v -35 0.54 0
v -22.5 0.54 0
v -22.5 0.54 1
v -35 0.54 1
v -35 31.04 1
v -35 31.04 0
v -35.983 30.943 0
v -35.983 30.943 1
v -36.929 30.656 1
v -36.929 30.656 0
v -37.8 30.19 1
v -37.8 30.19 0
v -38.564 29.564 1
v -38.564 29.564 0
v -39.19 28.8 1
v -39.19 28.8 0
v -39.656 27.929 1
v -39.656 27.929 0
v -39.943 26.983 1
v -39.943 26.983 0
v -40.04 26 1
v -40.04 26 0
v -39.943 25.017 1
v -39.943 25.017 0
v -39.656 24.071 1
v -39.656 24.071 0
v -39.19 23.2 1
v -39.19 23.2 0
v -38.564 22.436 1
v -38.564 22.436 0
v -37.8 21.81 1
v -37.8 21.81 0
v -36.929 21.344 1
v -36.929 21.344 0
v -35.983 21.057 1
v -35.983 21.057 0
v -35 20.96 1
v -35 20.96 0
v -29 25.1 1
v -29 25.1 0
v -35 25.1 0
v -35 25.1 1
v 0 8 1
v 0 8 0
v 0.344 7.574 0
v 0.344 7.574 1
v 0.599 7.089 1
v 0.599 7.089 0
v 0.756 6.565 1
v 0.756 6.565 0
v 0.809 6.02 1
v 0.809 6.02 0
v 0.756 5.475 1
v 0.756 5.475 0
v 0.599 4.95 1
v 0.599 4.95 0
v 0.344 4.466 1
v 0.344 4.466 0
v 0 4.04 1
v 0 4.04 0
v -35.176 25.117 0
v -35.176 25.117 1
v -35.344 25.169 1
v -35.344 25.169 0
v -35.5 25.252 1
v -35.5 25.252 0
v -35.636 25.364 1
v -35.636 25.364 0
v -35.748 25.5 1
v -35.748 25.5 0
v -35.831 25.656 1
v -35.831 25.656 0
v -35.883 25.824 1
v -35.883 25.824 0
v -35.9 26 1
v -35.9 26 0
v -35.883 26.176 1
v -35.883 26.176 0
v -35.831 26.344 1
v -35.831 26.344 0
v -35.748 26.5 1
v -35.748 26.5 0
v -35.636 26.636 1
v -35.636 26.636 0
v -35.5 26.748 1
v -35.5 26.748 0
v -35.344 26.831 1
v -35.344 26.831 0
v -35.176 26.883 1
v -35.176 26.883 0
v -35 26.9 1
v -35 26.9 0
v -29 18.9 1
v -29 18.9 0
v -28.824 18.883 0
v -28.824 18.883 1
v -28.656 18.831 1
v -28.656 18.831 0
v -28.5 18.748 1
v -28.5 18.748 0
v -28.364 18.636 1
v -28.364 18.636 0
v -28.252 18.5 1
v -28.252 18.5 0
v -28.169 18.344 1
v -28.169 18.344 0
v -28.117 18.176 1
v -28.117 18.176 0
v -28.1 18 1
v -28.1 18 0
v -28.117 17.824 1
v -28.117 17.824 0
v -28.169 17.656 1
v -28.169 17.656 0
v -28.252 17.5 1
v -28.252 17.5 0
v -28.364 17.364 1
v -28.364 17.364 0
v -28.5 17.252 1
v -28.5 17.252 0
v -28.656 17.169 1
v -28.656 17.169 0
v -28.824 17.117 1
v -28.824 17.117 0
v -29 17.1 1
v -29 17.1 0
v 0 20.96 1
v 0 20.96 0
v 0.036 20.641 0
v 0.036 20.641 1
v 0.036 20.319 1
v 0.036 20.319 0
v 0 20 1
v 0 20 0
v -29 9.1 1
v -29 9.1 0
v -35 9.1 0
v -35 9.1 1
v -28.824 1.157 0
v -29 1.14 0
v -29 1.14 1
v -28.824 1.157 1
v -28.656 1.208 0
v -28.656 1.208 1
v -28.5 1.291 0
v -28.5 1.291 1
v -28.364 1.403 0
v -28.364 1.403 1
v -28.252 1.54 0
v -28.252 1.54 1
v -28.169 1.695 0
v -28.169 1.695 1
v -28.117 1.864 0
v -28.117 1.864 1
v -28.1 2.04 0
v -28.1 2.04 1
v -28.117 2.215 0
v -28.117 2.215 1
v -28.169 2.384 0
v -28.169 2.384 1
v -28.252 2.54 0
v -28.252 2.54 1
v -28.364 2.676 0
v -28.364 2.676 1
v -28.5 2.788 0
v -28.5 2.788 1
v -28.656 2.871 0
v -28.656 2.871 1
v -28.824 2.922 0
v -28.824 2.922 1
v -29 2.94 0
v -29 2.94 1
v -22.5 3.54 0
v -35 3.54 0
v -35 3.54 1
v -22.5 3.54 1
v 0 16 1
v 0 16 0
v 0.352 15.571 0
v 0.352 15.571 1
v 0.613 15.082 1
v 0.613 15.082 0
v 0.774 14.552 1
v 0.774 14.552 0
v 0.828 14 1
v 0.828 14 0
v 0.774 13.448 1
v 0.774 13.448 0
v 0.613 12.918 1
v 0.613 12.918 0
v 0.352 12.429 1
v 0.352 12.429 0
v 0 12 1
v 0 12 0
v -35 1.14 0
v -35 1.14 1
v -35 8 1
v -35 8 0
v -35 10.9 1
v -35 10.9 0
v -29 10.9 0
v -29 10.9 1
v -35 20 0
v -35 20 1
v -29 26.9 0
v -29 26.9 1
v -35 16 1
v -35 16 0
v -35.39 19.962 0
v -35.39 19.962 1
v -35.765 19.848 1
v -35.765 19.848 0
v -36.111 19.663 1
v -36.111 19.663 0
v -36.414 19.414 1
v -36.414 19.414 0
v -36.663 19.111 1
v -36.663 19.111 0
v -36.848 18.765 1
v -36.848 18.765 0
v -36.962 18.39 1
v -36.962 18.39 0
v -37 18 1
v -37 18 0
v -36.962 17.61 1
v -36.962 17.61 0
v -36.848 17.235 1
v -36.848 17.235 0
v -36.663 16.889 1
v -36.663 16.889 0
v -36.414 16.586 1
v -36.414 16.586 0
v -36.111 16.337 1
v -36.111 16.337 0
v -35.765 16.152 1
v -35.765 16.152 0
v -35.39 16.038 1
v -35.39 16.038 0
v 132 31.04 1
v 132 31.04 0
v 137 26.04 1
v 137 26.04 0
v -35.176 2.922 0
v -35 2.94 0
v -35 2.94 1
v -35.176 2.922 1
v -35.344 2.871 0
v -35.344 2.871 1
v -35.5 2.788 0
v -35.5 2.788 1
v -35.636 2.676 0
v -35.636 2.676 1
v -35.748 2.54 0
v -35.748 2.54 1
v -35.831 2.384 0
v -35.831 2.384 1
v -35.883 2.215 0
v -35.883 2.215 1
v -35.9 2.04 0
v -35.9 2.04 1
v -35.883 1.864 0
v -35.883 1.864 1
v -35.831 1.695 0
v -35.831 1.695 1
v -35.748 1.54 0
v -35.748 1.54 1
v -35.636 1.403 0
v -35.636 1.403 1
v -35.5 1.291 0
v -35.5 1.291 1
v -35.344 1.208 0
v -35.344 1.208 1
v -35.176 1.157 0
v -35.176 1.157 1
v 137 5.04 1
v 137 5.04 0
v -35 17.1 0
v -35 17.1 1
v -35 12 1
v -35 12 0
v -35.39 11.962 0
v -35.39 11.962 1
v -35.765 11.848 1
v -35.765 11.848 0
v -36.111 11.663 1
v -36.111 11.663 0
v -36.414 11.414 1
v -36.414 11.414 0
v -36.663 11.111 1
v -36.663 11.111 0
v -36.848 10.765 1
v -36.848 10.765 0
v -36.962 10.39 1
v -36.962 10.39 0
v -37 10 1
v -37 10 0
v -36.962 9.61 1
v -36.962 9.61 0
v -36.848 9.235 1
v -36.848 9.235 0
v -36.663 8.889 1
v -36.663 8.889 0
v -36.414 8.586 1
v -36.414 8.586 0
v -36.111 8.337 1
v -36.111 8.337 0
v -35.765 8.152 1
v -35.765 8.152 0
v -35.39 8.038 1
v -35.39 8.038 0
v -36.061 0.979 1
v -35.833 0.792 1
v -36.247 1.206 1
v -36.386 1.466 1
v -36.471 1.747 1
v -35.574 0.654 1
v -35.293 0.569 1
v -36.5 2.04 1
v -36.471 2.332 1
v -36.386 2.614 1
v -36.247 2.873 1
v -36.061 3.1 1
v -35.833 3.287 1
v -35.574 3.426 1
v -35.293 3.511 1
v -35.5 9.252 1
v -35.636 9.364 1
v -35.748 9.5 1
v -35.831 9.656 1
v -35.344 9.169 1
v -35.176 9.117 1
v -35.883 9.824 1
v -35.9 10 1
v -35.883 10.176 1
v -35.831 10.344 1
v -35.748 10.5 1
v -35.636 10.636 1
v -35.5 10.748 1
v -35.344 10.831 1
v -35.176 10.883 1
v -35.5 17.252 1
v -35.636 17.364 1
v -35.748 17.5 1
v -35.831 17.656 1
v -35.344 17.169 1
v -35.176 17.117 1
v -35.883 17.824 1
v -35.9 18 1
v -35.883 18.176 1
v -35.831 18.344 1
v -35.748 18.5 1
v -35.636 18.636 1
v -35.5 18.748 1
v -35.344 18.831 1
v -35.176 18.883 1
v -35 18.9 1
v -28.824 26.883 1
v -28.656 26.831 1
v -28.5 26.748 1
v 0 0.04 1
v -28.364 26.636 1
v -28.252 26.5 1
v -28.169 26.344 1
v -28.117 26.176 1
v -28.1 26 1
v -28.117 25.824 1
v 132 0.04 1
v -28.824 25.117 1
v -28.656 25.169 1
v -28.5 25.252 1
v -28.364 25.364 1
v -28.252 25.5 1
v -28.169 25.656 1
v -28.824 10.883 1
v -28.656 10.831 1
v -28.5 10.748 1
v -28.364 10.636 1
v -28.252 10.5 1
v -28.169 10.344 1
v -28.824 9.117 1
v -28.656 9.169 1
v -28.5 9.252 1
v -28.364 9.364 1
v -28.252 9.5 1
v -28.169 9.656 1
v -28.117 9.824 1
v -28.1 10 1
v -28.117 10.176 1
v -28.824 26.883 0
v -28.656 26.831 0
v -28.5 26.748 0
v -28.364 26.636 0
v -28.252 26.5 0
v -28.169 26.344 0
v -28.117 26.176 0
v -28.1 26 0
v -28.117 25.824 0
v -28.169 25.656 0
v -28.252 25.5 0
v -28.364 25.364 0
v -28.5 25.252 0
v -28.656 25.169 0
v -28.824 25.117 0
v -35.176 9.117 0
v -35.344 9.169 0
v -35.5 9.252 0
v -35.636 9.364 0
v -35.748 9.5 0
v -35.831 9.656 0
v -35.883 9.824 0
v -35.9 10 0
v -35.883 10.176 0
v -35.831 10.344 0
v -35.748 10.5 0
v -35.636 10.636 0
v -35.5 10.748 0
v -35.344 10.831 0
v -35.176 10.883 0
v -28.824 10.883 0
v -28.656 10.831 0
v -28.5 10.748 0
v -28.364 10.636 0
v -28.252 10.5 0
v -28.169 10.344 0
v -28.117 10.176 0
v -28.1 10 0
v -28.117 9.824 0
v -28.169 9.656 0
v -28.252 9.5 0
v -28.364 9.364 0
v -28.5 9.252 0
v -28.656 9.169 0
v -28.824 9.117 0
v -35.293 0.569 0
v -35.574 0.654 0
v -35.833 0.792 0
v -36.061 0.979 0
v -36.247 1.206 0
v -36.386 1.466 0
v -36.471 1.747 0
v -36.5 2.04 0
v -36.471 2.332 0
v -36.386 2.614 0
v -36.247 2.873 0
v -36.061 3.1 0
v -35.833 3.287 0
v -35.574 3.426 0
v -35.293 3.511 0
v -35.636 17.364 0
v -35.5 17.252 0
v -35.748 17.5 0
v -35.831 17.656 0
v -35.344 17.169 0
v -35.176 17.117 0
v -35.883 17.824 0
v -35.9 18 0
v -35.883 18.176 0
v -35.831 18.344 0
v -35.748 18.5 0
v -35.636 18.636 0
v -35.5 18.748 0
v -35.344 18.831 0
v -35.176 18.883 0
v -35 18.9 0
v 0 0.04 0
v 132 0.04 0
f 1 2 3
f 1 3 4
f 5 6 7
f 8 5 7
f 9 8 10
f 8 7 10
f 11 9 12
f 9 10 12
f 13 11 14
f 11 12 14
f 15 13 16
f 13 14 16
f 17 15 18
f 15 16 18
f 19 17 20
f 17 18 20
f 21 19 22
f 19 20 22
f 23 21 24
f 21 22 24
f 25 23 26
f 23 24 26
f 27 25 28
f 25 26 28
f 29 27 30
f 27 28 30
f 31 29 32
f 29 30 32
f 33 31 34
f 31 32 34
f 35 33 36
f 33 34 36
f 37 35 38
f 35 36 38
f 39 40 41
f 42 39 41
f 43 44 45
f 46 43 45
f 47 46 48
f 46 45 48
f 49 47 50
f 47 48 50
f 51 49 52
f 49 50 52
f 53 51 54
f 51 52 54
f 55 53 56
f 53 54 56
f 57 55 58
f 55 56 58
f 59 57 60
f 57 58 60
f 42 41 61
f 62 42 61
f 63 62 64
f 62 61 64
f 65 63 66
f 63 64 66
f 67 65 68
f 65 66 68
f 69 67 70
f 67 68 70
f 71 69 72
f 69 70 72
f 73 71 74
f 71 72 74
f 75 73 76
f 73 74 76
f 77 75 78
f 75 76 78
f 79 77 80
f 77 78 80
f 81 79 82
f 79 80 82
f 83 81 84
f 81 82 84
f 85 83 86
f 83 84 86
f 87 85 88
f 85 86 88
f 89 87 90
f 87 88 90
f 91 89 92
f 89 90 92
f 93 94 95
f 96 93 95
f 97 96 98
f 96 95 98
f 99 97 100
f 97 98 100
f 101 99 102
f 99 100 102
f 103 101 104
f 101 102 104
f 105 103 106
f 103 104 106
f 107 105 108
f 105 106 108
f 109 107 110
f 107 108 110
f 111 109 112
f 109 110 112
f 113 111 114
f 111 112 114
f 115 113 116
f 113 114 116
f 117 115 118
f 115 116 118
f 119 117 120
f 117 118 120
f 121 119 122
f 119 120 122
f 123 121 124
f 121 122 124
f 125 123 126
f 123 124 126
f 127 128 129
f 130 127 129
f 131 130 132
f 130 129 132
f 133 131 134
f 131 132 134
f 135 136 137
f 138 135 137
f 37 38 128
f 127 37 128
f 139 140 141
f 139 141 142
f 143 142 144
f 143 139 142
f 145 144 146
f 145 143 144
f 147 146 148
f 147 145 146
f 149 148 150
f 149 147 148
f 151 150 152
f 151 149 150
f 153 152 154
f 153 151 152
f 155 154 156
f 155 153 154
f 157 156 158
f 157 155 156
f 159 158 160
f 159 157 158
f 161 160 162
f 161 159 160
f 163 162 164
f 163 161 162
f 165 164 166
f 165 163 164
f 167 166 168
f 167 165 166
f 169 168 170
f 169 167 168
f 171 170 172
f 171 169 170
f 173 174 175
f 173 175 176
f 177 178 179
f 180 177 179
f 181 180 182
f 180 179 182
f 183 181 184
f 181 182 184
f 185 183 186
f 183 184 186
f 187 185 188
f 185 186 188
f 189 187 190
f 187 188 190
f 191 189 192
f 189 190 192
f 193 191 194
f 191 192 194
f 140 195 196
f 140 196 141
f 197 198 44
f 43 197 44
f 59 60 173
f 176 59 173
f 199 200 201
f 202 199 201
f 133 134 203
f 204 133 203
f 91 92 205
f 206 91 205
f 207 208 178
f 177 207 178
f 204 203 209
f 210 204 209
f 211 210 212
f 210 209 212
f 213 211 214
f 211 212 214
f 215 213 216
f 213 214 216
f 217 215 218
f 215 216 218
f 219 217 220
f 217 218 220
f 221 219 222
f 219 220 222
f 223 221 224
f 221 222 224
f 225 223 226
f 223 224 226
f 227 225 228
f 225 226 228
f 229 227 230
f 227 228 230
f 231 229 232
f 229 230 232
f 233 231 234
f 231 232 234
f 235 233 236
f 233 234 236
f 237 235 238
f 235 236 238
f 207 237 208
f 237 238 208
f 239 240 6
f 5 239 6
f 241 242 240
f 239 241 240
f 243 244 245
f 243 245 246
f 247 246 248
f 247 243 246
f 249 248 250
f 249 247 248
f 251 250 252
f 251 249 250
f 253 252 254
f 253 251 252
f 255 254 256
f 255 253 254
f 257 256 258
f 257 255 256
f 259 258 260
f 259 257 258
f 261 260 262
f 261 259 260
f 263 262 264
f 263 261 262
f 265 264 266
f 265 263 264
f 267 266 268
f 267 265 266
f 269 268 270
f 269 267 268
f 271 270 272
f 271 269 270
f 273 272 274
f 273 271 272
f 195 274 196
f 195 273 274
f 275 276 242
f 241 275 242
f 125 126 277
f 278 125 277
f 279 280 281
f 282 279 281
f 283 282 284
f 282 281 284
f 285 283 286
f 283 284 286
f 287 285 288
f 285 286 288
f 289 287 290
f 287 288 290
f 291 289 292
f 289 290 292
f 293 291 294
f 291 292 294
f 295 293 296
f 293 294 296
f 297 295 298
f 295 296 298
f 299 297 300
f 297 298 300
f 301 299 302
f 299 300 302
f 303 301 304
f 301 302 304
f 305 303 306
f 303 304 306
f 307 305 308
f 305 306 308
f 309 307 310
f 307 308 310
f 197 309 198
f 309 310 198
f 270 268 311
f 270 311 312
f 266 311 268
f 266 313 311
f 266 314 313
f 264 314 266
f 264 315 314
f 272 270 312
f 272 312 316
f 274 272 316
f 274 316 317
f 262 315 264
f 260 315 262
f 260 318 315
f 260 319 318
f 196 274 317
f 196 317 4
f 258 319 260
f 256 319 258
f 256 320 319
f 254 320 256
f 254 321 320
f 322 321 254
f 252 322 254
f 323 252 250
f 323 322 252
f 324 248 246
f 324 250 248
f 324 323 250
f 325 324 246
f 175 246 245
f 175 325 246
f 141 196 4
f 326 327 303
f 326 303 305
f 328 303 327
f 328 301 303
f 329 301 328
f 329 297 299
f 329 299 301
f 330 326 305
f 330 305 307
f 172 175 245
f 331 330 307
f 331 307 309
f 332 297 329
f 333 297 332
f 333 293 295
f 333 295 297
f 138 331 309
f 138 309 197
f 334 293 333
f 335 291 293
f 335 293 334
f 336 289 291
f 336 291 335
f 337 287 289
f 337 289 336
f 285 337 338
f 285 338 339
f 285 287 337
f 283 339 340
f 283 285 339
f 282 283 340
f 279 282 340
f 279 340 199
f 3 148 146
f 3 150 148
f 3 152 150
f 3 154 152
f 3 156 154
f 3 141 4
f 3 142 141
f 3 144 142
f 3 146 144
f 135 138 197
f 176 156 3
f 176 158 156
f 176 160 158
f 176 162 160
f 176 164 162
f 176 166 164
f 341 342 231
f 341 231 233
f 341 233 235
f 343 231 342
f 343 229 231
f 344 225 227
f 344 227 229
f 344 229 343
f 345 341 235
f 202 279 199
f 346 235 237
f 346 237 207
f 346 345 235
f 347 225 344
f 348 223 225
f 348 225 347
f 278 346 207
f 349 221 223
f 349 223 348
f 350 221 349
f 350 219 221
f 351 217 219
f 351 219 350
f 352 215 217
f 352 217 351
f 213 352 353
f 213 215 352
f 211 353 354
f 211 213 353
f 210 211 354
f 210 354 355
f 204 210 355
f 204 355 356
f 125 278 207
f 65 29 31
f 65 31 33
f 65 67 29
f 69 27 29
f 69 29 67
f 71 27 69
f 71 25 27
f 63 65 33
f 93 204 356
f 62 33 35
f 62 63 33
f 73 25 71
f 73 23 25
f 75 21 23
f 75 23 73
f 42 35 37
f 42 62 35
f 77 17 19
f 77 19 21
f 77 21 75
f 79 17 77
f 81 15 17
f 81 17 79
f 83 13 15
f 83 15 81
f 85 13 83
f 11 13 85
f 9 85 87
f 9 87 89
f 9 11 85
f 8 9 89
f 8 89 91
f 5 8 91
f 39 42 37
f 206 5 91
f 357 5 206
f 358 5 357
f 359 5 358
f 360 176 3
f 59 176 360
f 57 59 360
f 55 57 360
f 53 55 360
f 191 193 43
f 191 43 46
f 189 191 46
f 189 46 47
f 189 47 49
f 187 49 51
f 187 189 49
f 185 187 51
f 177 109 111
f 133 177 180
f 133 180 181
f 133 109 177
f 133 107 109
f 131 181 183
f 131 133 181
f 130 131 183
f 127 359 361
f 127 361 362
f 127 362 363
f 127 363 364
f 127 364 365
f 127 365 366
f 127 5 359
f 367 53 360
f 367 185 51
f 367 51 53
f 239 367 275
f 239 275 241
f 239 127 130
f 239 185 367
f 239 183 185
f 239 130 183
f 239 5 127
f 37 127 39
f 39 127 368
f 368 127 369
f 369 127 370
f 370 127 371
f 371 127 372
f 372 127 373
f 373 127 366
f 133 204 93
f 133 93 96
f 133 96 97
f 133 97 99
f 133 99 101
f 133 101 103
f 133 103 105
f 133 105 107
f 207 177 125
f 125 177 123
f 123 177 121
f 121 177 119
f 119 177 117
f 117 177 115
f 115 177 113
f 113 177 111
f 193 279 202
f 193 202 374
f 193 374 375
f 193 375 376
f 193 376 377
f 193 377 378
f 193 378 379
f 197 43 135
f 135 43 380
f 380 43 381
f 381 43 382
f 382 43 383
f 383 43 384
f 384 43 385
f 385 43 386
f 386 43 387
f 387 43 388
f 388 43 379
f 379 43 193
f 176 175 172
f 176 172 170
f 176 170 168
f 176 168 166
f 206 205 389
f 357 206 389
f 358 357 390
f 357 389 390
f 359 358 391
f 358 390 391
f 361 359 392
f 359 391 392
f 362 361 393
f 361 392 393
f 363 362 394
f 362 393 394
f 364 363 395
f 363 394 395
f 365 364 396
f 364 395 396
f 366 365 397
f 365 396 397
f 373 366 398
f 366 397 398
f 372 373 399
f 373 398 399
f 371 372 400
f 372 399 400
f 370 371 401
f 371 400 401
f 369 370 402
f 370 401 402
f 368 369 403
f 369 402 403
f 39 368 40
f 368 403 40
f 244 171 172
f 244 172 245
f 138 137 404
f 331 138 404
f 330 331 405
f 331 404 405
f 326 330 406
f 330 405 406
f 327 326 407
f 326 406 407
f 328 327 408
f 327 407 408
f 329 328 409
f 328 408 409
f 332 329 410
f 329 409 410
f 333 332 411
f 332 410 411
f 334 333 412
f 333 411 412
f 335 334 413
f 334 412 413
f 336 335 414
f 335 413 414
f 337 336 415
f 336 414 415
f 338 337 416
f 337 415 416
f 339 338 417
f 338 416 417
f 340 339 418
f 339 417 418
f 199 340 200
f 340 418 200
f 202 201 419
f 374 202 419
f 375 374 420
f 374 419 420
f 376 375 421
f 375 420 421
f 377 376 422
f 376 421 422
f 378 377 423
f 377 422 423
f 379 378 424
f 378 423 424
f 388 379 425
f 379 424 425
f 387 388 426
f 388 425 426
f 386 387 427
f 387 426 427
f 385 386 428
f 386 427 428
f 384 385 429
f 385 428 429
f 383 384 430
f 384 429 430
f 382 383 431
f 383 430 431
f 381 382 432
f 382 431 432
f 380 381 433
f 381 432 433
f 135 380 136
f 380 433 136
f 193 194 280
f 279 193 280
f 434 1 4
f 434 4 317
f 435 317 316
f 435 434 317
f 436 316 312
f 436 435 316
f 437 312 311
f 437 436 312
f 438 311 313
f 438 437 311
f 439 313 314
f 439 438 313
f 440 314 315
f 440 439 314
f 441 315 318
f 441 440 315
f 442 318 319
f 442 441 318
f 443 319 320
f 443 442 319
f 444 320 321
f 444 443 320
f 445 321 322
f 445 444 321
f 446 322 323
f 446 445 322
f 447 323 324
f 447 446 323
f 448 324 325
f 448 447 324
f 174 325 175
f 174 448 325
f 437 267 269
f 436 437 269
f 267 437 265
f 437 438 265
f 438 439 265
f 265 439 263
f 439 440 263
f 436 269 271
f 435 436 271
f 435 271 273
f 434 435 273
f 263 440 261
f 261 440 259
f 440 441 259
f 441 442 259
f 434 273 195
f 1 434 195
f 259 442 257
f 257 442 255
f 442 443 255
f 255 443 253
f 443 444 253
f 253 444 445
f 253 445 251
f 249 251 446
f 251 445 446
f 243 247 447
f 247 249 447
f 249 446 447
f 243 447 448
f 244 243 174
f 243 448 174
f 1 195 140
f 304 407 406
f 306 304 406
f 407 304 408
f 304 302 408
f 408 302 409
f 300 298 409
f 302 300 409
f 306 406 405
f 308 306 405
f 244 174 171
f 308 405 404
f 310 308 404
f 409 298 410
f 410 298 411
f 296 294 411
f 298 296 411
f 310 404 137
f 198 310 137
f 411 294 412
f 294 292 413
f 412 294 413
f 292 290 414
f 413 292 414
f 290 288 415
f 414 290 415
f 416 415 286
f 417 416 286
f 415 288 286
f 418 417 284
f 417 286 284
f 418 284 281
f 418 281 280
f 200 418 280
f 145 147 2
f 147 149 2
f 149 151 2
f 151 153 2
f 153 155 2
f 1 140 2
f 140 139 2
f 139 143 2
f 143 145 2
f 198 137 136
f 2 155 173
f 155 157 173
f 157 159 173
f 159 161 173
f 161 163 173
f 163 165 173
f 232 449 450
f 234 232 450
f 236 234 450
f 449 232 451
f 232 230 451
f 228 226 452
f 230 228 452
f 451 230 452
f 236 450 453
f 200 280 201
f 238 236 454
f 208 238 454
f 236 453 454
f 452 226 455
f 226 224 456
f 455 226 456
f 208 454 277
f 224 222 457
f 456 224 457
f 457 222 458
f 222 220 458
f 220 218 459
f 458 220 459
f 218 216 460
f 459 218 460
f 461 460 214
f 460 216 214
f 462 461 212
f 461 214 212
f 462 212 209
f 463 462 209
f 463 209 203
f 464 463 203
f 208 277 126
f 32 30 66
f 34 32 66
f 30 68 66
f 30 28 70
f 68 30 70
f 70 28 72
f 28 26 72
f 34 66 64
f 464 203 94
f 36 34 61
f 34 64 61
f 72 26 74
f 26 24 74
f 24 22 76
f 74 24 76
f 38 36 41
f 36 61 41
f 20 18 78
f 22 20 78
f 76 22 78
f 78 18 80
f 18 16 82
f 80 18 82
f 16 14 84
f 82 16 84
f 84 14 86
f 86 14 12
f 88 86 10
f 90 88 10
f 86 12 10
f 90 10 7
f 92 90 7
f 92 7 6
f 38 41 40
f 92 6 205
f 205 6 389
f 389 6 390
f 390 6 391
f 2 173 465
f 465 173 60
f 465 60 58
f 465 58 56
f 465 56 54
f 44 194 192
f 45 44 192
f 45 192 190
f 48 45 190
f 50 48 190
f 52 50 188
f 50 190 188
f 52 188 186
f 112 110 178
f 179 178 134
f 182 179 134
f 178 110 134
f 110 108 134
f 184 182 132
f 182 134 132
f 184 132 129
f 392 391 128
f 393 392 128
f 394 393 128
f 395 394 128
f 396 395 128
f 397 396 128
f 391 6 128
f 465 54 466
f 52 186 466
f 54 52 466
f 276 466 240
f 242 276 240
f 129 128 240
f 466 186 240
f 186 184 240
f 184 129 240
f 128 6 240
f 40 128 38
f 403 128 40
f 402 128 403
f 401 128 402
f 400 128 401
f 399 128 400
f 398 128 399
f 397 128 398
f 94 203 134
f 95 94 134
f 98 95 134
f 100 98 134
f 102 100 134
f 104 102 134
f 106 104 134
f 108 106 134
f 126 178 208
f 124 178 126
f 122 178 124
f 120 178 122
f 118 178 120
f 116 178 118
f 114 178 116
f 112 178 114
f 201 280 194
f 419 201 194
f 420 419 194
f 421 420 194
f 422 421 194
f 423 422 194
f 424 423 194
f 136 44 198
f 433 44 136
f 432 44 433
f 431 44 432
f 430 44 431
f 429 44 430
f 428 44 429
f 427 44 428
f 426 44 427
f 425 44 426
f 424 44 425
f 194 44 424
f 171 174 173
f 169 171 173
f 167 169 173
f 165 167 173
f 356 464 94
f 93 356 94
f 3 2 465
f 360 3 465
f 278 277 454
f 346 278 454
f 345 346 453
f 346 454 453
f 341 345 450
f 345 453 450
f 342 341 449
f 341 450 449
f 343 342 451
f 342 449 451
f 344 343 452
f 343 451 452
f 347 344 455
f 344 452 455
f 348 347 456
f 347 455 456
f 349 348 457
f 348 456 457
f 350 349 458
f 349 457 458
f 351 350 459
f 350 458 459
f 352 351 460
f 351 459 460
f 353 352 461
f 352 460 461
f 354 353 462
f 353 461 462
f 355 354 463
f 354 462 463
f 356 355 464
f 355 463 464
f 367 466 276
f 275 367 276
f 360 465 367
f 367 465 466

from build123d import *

# Parameters (mm, degrees)
BOSS_EXTRU_1_DEPTH = 1


with BuildPart() as part:
    # Esquisse4 → Boss.-Extru.1 (new body)
    with BuildSketch(Plane.XY):
        Polygon((109.153274168, 31.039696422), (109.153274168, 0.039696422), (132, 0.039696422), (137, 5.039696422), (137, 26.039696422), (132, 31.039696422), align=None)
        with BuildLine():
            Line((0, 4.039696422), (-22.5, 3.539696422))
            Line((-22.5, 3.539696422), (-22.5, 0.539696422))
            Line((-22.5, 0.539696422), (0, 0.039696422))
            Line((0, 0.039696422), (109.153274168, 0.039696422))
            Line((109.153274168, 0.039696422), (109.153274168, 31.039696422))
            Line((109.153274168, 31.039696422), (0, 31.039696422))
            Line((0, 31.039696422), (-35, 31.039696422))
            ThreePointArc((-35, 31.039696422), (-40.039696422, 26), (-35, 20.960303578))
            Line((-35, 20.960303578), (0, 20.960303578))
            ThreePointArc((0, 20.960303578), (0.041053045, 20.480151789), (0, 20))
            Line((0, 20), (-35, 20))
            ThreePointArc((-35, 20), (-37, 18), (-35, 16))
            Line((-35, 16), (0, 16))
            ThreePointArc((0, 16), (0.828427125, 14), (0, 12))
            Line((0, 12), (-22.5, 12))
            Line((-22.5, 12), (-22.5, 8))
            Line((-22.5, 8), (0, 8))
            ThreePointArc((0, 8), (0.808773964, 6.019848211), (0, 4.039696422))
        make_face()
        with BuildLine():
            ThreePointArc((-35, 17.1), (-35.9, 18), (-35, 18.9))
            Line((-35, 18.9), (-29, 18.9))
            ThreePointArc((-29, 18.9), (-28.1, 18), (-29, 17.1))
            Line((-29, 17.1), (-35, 17.1))
        make_face(mode=Mode.SUBTRACT)
        with BuildLine():
            ThreePointArc((-35, 25.1), (-35.9, 26), (-35, 26.9))
            Line((-35, 26.9), (-29, 26.9))
            ThreePointArc((-29, 26.9), (-28.1, 26), (-29, 25.1))
            Line((-29, 25.1), (-35, 25.1))
        make_face(mode=Mode.SUBTRACT)
        with BuildLine():
            Line((-35, 8), (-22.5, 8))
            Line((-22.5, 8), (-22.5, 12))
            Line((-22.5, 12), (-35, 12))
            ThreePointArc((-35, 12), (-37, 10), (-35, 8))
        make_face()
        with BuildLine():
            ThreePointArc((-35, 9.1), (-35.9, 10), (-35, 10.9))
            Line((-35, 10.9), (-29, 10.9))
            ThreePointArc((-29, 10.9), (-28.1, 10), (-29, 9.1))
            Line((-29, 9.1), (-35, 9.1))
        make_face(mode=Mode.SUBTRACT)
        with BuildLine():
            ThreePointArc((-35, 0.539696422), (-36.5, 2.039696422), (-35, 3.539696422))
            Line((-35, 3.539696422), (-22.5, 3.539696422))
            Line((-22.5, 3.539696422), (-22.5, 0.539696422))
            Line((-22.5, 0.539696422), (-35, 0.539696422))
        make_face()
        with BuildLine():
            ThreePointArc((-29, 1.139696422), (-28.1, 2.039696422), (-29, 2.939696422))
            Line((-29, 2.939696422), (-35, 2.939696422))
            ThreePointArc((-35, 2.939696422), (-35.9, 2.039696422), (-35, 1.139696422))
            Line((-35, 1.139696422), (-29, 1.139696422))
        make_face(mode=Mode.SUBTRACT)
    extrude(amount=BOSS_EXTRU_1_DEPTH)


solid = part.part
